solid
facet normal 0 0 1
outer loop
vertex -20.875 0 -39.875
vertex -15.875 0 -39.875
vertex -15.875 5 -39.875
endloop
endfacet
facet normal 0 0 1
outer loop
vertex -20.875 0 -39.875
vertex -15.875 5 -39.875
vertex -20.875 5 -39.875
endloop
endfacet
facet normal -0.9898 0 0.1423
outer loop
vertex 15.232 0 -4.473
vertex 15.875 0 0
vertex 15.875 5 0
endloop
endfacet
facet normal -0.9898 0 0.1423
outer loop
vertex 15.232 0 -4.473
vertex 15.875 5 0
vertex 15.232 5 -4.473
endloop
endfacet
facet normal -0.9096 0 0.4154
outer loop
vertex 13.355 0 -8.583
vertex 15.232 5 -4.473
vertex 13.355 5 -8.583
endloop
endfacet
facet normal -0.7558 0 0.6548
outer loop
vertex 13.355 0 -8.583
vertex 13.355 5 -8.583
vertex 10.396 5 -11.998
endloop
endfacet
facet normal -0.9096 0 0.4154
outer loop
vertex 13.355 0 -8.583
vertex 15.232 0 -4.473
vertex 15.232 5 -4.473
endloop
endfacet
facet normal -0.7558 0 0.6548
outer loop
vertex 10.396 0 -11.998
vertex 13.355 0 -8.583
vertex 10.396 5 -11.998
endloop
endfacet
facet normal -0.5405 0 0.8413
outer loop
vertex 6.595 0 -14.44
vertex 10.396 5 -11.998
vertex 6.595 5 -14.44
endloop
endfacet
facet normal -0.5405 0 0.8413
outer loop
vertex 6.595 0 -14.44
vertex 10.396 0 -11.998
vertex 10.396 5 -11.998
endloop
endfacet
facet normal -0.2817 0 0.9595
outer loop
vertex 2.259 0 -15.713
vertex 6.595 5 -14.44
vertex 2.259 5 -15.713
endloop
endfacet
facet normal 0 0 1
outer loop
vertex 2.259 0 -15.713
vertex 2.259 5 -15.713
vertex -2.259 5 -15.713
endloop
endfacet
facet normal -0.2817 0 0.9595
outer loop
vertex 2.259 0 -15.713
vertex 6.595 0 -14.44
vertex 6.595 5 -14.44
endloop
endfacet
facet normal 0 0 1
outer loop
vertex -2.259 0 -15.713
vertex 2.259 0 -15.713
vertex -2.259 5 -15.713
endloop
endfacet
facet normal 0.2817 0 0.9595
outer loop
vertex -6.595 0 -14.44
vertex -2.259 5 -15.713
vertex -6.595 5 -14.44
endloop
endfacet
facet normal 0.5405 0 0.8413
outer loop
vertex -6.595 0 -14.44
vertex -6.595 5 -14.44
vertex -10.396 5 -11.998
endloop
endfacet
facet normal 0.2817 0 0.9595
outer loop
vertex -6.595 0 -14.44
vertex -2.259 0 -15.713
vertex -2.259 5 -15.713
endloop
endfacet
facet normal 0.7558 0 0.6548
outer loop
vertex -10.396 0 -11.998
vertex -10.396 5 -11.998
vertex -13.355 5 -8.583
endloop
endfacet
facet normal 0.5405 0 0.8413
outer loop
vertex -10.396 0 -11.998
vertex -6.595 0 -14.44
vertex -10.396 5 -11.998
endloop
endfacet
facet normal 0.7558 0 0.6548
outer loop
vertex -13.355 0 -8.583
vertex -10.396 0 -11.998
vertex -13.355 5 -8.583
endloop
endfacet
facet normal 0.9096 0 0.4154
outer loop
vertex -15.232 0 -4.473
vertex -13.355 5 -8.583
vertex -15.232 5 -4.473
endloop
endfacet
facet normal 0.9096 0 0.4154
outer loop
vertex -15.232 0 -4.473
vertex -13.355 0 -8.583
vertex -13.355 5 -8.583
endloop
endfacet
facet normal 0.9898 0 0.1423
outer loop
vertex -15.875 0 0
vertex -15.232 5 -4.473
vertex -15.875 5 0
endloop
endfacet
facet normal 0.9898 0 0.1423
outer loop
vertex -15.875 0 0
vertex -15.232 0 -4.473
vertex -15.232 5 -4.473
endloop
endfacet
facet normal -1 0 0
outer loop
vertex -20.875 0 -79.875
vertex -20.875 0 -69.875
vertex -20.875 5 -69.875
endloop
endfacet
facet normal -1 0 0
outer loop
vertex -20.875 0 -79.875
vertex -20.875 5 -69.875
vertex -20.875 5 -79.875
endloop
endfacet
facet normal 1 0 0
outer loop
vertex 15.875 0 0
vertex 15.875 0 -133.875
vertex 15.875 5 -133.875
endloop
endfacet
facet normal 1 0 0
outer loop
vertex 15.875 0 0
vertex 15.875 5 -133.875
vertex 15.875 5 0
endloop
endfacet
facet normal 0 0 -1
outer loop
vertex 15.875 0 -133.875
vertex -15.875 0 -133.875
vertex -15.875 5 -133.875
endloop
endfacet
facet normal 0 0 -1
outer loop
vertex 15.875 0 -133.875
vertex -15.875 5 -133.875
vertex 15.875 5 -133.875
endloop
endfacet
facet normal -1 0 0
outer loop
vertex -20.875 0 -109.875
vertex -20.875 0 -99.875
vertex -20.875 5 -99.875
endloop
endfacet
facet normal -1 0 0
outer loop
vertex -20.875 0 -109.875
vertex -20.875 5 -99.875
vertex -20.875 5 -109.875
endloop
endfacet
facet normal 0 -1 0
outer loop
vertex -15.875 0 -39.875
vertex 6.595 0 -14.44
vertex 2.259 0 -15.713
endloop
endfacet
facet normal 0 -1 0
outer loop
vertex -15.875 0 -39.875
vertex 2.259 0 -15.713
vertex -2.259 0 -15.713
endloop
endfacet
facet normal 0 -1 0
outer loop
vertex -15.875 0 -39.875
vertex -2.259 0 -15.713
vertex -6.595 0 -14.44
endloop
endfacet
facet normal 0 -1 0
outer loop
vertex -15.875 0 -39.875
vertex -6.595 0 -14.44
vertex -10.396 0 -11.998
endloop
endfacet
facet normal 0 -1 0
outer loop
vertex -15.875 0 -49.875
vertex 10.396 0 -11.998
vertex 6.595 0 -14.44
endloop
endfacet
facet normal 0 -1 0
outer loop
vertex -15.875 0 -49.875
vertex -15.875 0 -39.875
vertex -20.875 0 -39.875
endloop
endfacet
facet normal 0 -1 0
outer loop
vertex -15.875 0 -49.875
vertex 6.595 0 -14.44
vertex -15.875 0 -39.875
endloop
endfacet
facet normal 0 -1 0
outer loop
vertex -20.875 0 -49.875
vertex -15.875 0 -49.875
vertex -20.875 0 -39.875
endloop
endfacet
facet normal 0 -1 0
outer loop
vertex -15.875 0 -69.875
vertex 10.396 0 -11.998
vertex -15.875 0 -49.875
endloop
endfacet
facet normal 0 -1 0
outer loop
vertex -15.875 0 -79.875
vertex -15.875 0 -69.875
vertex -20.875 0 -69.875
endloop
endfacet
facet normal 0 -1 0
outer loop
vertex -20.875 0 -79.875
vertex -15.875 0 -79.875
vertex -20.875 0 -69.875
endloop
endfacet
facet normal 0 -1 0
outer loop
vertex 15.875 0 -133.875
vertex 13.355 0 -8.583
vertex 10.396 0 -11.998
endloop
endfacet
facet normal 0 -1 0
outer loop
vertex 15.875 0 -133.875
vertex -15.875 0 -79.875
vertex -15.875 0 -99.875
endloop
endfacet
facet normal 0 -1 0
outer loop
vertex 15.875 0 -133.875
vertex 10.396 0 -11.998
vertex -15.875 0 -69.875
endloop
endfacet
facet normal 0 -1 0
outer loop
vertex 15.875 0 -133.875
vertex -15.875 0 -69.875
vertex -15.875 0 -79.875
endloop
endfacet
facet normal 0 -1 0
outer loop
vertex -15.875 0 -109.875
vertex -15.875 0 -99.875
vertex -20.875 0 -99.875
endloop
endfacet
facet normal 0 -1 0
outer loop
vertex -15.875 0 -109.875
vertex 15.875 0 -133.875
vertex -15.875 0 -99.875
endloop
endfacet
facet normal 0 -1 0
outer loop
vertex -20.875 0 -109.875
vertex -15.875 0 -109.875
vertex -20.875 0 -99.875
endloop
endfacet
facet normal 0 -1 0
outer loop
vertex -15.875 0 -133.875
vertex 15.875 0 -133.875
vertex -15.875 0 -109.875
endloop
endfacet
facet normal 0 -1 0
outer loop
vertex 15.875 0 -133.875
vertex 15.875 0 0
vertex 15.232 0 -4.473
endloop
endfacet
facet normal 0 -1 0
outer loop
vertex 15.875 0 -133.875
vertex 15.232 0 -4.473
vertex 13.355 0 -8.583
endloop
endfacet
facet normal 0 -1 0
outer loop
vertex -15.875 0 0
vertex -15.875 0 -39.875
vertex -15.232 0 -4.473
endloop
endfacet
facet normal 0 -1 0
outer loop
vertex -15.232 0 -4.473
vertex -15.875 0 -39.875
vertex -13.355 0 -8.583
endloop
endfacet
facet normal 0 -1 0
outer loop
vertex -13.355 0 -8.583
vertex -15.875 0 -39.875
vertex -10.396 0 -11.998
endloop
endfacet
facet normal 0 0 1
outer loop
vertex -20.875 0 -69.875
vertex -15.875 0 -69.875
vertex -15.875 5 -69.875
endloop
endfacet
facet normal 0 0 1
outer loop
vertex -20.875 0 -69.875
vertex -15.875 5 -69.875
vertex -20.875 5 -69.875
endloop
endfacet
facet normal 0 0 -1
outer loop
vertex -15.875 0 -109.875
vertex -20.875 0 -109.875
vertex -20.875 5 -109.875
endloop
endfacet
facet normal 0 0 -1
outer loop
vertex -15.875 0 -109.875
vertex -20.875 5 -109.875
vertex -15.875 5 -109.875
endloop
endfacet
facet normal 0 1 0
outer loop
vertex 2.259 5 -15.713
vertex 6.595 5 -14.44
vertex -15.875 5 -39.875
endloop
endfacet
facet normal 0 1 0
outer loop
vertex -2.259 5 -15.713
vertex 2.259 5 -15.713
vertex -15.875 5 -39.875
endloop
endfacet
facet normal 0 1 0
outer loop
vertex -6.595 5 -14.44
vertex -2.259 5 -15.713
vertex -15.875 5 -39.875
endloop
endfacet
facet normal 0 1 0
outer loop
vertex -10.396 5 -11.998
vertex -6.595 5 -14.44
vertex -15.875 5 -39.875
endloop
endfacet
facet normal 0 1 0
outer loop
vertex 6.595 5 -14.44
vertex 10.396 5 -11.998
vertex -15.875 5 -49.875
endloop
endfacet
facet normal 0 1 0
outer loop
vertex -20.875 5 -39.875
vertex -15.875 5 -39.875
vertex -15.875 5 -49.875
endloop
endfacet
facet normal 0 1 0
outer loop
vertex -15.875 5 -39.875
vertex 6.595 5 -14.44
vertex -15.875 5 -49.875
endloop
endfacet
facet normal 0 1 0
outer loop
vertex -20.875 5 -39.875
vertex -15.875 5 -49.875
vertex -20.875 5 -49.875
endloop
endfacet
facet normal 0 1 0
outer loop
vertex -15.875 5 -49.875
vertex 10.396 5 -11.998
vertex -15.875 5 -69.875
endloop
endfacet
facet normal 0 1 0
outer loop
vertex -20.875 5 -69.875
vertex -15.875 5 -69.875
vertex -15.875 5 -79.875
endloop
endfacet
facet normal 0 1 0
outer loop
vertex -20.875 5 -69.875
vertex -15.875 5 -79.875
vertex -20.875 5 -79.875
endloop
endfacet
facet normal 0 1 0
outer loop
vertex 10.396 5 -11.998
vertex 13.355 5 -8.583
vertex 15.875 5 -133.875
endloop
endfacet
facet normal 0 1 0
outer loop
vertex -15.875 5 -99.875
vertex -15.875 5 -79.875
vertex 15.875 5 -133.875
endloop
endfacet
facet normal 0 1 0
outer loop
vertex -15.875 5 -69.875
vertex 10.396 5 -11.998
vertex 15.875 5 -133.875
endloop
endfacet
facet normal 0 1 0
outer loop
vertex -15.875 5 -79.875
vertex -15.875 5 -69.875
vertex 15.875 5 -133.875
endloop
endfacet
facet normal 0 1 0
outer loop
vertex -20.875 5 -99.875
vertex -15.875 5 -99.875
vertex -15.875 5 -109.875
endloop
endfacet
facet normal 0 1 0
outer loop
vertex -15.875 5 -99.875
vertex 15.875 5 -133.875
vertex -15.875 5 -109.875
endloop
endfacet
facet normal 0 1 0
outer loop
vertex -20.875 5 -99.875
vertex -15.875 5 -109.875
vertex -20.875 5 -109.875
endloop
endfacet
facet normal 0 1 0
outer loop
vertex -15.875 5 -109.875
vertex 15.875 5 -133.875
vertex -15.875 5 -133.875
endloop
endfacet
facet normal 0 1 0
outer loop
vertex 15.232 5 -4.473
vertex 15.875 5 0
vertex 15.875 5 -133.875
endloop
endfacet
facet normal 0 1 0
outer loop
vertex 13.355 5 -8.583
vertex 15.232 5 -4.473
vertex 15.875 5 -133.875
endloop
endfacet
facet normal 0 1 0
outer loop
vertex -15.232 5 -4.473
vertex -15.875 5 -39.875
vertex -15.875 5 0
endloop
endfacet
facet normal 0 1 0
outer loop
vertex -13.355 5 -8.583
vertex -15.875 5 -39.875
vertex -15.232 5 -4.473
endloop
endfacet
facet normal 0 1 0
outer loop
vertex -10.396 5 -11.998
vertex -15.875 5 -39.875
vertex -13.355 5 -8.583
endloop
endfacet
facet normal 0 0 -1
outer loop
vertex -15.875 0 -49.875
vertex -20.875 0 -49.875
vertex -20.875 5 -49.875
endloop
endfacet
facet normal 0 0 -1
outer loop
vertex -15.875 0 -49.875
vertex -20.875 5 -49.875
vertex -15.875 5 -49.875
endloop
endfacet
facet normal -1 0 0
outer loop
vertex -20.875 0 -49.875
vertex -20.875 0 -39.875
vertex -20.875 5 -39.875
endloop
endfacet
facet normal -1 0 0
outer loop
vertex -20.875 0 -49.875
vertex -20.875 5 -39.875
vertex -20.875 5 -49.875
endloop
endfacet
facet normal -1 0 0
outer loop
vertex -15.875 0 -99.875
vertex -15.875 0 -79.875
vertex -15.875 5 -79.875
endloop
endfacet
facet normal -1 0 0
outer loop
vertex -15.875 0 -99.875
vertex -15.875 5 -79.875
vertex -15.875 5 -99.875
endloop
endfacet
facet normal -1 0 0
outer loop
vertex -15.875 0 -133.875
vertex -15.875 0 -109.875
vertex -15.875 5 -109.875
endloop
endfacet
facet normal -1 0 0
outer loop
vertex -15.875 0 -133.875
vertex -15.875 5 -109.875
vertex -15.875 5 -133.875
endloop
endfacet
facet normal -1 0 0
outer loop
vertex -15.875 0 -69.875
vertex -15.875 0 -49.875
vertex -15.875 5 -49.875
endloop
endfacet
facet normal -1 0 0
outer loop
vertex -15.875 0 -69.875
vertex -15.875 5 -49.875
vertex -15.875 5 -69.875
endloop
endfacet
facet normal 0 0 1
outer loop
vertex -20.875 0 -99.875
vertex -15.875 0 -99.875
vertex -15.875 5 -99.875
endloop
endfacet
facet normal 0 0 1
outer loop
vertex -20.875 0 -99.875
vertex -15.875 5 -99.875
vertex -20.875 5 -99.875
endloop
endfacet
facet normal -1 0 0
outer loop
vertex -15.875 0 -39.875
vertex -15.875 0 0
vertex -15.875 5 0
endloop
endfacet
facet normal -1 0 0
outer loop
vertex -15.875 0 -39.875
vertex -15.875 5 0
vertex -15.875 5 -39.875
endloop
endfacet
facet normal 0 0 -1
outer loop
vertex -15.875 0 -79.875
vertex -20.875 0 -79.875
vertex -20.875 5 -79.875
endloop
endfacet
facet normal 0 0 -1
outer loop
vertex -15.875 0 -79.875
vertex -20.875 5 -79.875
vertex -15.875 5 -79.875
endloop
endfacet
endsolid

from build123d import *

# Parameters (mm, degrees)
BOSS_EXTRUDE1_DEPTH = 5


with BuildPart() as part:
    # Sketch9 → Boss-Extrude1 (new body)
    with BuildSketch(Plane(origin=(0, 0, 0), x_dir=(1, 0, 0), z_dir=(0, 1, 0))):
        with BuildLine():
            Line((-15.875, 109.875), (-15.875, 133.875))
            Line((-15.875, 133.875), (15.875, 133.875))
            Line((15.875, 133.875), (15.875, 0))
            ThreePointArc((15.875, 0), (0, 15.875), (-15.875, 0))
            Line((-15.875, 0), (-15.875, 39.875))
            Line((-15.875, 39.875), (-20.875, 39.875))
            Line((-20.875, 39.875), (-20.875, 49.875))
            Line((-20.875, 49.875), (-15.875, 49.875))
            Line((-15.875, 49.875), (-15.875, 69.875))
            Line((-15.875, 69.875), (-20.875, 69.875))
            Line((-20.875, 69.875), (-20.875, 79.875))
            Line((-20.875, 79.875), (-15.875, 79.875))
            Line((-15.875, 79.875), (-15.875, 99.875))
            Line((-15.875, 99.875), (-20.875, 99.875))
            Line((-20.875, 99.875), (-20.875, 109.875))
            Line((-20.875, 109.875), (-15.875, 109.875))
        make_face()
    extrude(amount=BOSS_EXTRUDE1_DEPTH)


solid = part.part
